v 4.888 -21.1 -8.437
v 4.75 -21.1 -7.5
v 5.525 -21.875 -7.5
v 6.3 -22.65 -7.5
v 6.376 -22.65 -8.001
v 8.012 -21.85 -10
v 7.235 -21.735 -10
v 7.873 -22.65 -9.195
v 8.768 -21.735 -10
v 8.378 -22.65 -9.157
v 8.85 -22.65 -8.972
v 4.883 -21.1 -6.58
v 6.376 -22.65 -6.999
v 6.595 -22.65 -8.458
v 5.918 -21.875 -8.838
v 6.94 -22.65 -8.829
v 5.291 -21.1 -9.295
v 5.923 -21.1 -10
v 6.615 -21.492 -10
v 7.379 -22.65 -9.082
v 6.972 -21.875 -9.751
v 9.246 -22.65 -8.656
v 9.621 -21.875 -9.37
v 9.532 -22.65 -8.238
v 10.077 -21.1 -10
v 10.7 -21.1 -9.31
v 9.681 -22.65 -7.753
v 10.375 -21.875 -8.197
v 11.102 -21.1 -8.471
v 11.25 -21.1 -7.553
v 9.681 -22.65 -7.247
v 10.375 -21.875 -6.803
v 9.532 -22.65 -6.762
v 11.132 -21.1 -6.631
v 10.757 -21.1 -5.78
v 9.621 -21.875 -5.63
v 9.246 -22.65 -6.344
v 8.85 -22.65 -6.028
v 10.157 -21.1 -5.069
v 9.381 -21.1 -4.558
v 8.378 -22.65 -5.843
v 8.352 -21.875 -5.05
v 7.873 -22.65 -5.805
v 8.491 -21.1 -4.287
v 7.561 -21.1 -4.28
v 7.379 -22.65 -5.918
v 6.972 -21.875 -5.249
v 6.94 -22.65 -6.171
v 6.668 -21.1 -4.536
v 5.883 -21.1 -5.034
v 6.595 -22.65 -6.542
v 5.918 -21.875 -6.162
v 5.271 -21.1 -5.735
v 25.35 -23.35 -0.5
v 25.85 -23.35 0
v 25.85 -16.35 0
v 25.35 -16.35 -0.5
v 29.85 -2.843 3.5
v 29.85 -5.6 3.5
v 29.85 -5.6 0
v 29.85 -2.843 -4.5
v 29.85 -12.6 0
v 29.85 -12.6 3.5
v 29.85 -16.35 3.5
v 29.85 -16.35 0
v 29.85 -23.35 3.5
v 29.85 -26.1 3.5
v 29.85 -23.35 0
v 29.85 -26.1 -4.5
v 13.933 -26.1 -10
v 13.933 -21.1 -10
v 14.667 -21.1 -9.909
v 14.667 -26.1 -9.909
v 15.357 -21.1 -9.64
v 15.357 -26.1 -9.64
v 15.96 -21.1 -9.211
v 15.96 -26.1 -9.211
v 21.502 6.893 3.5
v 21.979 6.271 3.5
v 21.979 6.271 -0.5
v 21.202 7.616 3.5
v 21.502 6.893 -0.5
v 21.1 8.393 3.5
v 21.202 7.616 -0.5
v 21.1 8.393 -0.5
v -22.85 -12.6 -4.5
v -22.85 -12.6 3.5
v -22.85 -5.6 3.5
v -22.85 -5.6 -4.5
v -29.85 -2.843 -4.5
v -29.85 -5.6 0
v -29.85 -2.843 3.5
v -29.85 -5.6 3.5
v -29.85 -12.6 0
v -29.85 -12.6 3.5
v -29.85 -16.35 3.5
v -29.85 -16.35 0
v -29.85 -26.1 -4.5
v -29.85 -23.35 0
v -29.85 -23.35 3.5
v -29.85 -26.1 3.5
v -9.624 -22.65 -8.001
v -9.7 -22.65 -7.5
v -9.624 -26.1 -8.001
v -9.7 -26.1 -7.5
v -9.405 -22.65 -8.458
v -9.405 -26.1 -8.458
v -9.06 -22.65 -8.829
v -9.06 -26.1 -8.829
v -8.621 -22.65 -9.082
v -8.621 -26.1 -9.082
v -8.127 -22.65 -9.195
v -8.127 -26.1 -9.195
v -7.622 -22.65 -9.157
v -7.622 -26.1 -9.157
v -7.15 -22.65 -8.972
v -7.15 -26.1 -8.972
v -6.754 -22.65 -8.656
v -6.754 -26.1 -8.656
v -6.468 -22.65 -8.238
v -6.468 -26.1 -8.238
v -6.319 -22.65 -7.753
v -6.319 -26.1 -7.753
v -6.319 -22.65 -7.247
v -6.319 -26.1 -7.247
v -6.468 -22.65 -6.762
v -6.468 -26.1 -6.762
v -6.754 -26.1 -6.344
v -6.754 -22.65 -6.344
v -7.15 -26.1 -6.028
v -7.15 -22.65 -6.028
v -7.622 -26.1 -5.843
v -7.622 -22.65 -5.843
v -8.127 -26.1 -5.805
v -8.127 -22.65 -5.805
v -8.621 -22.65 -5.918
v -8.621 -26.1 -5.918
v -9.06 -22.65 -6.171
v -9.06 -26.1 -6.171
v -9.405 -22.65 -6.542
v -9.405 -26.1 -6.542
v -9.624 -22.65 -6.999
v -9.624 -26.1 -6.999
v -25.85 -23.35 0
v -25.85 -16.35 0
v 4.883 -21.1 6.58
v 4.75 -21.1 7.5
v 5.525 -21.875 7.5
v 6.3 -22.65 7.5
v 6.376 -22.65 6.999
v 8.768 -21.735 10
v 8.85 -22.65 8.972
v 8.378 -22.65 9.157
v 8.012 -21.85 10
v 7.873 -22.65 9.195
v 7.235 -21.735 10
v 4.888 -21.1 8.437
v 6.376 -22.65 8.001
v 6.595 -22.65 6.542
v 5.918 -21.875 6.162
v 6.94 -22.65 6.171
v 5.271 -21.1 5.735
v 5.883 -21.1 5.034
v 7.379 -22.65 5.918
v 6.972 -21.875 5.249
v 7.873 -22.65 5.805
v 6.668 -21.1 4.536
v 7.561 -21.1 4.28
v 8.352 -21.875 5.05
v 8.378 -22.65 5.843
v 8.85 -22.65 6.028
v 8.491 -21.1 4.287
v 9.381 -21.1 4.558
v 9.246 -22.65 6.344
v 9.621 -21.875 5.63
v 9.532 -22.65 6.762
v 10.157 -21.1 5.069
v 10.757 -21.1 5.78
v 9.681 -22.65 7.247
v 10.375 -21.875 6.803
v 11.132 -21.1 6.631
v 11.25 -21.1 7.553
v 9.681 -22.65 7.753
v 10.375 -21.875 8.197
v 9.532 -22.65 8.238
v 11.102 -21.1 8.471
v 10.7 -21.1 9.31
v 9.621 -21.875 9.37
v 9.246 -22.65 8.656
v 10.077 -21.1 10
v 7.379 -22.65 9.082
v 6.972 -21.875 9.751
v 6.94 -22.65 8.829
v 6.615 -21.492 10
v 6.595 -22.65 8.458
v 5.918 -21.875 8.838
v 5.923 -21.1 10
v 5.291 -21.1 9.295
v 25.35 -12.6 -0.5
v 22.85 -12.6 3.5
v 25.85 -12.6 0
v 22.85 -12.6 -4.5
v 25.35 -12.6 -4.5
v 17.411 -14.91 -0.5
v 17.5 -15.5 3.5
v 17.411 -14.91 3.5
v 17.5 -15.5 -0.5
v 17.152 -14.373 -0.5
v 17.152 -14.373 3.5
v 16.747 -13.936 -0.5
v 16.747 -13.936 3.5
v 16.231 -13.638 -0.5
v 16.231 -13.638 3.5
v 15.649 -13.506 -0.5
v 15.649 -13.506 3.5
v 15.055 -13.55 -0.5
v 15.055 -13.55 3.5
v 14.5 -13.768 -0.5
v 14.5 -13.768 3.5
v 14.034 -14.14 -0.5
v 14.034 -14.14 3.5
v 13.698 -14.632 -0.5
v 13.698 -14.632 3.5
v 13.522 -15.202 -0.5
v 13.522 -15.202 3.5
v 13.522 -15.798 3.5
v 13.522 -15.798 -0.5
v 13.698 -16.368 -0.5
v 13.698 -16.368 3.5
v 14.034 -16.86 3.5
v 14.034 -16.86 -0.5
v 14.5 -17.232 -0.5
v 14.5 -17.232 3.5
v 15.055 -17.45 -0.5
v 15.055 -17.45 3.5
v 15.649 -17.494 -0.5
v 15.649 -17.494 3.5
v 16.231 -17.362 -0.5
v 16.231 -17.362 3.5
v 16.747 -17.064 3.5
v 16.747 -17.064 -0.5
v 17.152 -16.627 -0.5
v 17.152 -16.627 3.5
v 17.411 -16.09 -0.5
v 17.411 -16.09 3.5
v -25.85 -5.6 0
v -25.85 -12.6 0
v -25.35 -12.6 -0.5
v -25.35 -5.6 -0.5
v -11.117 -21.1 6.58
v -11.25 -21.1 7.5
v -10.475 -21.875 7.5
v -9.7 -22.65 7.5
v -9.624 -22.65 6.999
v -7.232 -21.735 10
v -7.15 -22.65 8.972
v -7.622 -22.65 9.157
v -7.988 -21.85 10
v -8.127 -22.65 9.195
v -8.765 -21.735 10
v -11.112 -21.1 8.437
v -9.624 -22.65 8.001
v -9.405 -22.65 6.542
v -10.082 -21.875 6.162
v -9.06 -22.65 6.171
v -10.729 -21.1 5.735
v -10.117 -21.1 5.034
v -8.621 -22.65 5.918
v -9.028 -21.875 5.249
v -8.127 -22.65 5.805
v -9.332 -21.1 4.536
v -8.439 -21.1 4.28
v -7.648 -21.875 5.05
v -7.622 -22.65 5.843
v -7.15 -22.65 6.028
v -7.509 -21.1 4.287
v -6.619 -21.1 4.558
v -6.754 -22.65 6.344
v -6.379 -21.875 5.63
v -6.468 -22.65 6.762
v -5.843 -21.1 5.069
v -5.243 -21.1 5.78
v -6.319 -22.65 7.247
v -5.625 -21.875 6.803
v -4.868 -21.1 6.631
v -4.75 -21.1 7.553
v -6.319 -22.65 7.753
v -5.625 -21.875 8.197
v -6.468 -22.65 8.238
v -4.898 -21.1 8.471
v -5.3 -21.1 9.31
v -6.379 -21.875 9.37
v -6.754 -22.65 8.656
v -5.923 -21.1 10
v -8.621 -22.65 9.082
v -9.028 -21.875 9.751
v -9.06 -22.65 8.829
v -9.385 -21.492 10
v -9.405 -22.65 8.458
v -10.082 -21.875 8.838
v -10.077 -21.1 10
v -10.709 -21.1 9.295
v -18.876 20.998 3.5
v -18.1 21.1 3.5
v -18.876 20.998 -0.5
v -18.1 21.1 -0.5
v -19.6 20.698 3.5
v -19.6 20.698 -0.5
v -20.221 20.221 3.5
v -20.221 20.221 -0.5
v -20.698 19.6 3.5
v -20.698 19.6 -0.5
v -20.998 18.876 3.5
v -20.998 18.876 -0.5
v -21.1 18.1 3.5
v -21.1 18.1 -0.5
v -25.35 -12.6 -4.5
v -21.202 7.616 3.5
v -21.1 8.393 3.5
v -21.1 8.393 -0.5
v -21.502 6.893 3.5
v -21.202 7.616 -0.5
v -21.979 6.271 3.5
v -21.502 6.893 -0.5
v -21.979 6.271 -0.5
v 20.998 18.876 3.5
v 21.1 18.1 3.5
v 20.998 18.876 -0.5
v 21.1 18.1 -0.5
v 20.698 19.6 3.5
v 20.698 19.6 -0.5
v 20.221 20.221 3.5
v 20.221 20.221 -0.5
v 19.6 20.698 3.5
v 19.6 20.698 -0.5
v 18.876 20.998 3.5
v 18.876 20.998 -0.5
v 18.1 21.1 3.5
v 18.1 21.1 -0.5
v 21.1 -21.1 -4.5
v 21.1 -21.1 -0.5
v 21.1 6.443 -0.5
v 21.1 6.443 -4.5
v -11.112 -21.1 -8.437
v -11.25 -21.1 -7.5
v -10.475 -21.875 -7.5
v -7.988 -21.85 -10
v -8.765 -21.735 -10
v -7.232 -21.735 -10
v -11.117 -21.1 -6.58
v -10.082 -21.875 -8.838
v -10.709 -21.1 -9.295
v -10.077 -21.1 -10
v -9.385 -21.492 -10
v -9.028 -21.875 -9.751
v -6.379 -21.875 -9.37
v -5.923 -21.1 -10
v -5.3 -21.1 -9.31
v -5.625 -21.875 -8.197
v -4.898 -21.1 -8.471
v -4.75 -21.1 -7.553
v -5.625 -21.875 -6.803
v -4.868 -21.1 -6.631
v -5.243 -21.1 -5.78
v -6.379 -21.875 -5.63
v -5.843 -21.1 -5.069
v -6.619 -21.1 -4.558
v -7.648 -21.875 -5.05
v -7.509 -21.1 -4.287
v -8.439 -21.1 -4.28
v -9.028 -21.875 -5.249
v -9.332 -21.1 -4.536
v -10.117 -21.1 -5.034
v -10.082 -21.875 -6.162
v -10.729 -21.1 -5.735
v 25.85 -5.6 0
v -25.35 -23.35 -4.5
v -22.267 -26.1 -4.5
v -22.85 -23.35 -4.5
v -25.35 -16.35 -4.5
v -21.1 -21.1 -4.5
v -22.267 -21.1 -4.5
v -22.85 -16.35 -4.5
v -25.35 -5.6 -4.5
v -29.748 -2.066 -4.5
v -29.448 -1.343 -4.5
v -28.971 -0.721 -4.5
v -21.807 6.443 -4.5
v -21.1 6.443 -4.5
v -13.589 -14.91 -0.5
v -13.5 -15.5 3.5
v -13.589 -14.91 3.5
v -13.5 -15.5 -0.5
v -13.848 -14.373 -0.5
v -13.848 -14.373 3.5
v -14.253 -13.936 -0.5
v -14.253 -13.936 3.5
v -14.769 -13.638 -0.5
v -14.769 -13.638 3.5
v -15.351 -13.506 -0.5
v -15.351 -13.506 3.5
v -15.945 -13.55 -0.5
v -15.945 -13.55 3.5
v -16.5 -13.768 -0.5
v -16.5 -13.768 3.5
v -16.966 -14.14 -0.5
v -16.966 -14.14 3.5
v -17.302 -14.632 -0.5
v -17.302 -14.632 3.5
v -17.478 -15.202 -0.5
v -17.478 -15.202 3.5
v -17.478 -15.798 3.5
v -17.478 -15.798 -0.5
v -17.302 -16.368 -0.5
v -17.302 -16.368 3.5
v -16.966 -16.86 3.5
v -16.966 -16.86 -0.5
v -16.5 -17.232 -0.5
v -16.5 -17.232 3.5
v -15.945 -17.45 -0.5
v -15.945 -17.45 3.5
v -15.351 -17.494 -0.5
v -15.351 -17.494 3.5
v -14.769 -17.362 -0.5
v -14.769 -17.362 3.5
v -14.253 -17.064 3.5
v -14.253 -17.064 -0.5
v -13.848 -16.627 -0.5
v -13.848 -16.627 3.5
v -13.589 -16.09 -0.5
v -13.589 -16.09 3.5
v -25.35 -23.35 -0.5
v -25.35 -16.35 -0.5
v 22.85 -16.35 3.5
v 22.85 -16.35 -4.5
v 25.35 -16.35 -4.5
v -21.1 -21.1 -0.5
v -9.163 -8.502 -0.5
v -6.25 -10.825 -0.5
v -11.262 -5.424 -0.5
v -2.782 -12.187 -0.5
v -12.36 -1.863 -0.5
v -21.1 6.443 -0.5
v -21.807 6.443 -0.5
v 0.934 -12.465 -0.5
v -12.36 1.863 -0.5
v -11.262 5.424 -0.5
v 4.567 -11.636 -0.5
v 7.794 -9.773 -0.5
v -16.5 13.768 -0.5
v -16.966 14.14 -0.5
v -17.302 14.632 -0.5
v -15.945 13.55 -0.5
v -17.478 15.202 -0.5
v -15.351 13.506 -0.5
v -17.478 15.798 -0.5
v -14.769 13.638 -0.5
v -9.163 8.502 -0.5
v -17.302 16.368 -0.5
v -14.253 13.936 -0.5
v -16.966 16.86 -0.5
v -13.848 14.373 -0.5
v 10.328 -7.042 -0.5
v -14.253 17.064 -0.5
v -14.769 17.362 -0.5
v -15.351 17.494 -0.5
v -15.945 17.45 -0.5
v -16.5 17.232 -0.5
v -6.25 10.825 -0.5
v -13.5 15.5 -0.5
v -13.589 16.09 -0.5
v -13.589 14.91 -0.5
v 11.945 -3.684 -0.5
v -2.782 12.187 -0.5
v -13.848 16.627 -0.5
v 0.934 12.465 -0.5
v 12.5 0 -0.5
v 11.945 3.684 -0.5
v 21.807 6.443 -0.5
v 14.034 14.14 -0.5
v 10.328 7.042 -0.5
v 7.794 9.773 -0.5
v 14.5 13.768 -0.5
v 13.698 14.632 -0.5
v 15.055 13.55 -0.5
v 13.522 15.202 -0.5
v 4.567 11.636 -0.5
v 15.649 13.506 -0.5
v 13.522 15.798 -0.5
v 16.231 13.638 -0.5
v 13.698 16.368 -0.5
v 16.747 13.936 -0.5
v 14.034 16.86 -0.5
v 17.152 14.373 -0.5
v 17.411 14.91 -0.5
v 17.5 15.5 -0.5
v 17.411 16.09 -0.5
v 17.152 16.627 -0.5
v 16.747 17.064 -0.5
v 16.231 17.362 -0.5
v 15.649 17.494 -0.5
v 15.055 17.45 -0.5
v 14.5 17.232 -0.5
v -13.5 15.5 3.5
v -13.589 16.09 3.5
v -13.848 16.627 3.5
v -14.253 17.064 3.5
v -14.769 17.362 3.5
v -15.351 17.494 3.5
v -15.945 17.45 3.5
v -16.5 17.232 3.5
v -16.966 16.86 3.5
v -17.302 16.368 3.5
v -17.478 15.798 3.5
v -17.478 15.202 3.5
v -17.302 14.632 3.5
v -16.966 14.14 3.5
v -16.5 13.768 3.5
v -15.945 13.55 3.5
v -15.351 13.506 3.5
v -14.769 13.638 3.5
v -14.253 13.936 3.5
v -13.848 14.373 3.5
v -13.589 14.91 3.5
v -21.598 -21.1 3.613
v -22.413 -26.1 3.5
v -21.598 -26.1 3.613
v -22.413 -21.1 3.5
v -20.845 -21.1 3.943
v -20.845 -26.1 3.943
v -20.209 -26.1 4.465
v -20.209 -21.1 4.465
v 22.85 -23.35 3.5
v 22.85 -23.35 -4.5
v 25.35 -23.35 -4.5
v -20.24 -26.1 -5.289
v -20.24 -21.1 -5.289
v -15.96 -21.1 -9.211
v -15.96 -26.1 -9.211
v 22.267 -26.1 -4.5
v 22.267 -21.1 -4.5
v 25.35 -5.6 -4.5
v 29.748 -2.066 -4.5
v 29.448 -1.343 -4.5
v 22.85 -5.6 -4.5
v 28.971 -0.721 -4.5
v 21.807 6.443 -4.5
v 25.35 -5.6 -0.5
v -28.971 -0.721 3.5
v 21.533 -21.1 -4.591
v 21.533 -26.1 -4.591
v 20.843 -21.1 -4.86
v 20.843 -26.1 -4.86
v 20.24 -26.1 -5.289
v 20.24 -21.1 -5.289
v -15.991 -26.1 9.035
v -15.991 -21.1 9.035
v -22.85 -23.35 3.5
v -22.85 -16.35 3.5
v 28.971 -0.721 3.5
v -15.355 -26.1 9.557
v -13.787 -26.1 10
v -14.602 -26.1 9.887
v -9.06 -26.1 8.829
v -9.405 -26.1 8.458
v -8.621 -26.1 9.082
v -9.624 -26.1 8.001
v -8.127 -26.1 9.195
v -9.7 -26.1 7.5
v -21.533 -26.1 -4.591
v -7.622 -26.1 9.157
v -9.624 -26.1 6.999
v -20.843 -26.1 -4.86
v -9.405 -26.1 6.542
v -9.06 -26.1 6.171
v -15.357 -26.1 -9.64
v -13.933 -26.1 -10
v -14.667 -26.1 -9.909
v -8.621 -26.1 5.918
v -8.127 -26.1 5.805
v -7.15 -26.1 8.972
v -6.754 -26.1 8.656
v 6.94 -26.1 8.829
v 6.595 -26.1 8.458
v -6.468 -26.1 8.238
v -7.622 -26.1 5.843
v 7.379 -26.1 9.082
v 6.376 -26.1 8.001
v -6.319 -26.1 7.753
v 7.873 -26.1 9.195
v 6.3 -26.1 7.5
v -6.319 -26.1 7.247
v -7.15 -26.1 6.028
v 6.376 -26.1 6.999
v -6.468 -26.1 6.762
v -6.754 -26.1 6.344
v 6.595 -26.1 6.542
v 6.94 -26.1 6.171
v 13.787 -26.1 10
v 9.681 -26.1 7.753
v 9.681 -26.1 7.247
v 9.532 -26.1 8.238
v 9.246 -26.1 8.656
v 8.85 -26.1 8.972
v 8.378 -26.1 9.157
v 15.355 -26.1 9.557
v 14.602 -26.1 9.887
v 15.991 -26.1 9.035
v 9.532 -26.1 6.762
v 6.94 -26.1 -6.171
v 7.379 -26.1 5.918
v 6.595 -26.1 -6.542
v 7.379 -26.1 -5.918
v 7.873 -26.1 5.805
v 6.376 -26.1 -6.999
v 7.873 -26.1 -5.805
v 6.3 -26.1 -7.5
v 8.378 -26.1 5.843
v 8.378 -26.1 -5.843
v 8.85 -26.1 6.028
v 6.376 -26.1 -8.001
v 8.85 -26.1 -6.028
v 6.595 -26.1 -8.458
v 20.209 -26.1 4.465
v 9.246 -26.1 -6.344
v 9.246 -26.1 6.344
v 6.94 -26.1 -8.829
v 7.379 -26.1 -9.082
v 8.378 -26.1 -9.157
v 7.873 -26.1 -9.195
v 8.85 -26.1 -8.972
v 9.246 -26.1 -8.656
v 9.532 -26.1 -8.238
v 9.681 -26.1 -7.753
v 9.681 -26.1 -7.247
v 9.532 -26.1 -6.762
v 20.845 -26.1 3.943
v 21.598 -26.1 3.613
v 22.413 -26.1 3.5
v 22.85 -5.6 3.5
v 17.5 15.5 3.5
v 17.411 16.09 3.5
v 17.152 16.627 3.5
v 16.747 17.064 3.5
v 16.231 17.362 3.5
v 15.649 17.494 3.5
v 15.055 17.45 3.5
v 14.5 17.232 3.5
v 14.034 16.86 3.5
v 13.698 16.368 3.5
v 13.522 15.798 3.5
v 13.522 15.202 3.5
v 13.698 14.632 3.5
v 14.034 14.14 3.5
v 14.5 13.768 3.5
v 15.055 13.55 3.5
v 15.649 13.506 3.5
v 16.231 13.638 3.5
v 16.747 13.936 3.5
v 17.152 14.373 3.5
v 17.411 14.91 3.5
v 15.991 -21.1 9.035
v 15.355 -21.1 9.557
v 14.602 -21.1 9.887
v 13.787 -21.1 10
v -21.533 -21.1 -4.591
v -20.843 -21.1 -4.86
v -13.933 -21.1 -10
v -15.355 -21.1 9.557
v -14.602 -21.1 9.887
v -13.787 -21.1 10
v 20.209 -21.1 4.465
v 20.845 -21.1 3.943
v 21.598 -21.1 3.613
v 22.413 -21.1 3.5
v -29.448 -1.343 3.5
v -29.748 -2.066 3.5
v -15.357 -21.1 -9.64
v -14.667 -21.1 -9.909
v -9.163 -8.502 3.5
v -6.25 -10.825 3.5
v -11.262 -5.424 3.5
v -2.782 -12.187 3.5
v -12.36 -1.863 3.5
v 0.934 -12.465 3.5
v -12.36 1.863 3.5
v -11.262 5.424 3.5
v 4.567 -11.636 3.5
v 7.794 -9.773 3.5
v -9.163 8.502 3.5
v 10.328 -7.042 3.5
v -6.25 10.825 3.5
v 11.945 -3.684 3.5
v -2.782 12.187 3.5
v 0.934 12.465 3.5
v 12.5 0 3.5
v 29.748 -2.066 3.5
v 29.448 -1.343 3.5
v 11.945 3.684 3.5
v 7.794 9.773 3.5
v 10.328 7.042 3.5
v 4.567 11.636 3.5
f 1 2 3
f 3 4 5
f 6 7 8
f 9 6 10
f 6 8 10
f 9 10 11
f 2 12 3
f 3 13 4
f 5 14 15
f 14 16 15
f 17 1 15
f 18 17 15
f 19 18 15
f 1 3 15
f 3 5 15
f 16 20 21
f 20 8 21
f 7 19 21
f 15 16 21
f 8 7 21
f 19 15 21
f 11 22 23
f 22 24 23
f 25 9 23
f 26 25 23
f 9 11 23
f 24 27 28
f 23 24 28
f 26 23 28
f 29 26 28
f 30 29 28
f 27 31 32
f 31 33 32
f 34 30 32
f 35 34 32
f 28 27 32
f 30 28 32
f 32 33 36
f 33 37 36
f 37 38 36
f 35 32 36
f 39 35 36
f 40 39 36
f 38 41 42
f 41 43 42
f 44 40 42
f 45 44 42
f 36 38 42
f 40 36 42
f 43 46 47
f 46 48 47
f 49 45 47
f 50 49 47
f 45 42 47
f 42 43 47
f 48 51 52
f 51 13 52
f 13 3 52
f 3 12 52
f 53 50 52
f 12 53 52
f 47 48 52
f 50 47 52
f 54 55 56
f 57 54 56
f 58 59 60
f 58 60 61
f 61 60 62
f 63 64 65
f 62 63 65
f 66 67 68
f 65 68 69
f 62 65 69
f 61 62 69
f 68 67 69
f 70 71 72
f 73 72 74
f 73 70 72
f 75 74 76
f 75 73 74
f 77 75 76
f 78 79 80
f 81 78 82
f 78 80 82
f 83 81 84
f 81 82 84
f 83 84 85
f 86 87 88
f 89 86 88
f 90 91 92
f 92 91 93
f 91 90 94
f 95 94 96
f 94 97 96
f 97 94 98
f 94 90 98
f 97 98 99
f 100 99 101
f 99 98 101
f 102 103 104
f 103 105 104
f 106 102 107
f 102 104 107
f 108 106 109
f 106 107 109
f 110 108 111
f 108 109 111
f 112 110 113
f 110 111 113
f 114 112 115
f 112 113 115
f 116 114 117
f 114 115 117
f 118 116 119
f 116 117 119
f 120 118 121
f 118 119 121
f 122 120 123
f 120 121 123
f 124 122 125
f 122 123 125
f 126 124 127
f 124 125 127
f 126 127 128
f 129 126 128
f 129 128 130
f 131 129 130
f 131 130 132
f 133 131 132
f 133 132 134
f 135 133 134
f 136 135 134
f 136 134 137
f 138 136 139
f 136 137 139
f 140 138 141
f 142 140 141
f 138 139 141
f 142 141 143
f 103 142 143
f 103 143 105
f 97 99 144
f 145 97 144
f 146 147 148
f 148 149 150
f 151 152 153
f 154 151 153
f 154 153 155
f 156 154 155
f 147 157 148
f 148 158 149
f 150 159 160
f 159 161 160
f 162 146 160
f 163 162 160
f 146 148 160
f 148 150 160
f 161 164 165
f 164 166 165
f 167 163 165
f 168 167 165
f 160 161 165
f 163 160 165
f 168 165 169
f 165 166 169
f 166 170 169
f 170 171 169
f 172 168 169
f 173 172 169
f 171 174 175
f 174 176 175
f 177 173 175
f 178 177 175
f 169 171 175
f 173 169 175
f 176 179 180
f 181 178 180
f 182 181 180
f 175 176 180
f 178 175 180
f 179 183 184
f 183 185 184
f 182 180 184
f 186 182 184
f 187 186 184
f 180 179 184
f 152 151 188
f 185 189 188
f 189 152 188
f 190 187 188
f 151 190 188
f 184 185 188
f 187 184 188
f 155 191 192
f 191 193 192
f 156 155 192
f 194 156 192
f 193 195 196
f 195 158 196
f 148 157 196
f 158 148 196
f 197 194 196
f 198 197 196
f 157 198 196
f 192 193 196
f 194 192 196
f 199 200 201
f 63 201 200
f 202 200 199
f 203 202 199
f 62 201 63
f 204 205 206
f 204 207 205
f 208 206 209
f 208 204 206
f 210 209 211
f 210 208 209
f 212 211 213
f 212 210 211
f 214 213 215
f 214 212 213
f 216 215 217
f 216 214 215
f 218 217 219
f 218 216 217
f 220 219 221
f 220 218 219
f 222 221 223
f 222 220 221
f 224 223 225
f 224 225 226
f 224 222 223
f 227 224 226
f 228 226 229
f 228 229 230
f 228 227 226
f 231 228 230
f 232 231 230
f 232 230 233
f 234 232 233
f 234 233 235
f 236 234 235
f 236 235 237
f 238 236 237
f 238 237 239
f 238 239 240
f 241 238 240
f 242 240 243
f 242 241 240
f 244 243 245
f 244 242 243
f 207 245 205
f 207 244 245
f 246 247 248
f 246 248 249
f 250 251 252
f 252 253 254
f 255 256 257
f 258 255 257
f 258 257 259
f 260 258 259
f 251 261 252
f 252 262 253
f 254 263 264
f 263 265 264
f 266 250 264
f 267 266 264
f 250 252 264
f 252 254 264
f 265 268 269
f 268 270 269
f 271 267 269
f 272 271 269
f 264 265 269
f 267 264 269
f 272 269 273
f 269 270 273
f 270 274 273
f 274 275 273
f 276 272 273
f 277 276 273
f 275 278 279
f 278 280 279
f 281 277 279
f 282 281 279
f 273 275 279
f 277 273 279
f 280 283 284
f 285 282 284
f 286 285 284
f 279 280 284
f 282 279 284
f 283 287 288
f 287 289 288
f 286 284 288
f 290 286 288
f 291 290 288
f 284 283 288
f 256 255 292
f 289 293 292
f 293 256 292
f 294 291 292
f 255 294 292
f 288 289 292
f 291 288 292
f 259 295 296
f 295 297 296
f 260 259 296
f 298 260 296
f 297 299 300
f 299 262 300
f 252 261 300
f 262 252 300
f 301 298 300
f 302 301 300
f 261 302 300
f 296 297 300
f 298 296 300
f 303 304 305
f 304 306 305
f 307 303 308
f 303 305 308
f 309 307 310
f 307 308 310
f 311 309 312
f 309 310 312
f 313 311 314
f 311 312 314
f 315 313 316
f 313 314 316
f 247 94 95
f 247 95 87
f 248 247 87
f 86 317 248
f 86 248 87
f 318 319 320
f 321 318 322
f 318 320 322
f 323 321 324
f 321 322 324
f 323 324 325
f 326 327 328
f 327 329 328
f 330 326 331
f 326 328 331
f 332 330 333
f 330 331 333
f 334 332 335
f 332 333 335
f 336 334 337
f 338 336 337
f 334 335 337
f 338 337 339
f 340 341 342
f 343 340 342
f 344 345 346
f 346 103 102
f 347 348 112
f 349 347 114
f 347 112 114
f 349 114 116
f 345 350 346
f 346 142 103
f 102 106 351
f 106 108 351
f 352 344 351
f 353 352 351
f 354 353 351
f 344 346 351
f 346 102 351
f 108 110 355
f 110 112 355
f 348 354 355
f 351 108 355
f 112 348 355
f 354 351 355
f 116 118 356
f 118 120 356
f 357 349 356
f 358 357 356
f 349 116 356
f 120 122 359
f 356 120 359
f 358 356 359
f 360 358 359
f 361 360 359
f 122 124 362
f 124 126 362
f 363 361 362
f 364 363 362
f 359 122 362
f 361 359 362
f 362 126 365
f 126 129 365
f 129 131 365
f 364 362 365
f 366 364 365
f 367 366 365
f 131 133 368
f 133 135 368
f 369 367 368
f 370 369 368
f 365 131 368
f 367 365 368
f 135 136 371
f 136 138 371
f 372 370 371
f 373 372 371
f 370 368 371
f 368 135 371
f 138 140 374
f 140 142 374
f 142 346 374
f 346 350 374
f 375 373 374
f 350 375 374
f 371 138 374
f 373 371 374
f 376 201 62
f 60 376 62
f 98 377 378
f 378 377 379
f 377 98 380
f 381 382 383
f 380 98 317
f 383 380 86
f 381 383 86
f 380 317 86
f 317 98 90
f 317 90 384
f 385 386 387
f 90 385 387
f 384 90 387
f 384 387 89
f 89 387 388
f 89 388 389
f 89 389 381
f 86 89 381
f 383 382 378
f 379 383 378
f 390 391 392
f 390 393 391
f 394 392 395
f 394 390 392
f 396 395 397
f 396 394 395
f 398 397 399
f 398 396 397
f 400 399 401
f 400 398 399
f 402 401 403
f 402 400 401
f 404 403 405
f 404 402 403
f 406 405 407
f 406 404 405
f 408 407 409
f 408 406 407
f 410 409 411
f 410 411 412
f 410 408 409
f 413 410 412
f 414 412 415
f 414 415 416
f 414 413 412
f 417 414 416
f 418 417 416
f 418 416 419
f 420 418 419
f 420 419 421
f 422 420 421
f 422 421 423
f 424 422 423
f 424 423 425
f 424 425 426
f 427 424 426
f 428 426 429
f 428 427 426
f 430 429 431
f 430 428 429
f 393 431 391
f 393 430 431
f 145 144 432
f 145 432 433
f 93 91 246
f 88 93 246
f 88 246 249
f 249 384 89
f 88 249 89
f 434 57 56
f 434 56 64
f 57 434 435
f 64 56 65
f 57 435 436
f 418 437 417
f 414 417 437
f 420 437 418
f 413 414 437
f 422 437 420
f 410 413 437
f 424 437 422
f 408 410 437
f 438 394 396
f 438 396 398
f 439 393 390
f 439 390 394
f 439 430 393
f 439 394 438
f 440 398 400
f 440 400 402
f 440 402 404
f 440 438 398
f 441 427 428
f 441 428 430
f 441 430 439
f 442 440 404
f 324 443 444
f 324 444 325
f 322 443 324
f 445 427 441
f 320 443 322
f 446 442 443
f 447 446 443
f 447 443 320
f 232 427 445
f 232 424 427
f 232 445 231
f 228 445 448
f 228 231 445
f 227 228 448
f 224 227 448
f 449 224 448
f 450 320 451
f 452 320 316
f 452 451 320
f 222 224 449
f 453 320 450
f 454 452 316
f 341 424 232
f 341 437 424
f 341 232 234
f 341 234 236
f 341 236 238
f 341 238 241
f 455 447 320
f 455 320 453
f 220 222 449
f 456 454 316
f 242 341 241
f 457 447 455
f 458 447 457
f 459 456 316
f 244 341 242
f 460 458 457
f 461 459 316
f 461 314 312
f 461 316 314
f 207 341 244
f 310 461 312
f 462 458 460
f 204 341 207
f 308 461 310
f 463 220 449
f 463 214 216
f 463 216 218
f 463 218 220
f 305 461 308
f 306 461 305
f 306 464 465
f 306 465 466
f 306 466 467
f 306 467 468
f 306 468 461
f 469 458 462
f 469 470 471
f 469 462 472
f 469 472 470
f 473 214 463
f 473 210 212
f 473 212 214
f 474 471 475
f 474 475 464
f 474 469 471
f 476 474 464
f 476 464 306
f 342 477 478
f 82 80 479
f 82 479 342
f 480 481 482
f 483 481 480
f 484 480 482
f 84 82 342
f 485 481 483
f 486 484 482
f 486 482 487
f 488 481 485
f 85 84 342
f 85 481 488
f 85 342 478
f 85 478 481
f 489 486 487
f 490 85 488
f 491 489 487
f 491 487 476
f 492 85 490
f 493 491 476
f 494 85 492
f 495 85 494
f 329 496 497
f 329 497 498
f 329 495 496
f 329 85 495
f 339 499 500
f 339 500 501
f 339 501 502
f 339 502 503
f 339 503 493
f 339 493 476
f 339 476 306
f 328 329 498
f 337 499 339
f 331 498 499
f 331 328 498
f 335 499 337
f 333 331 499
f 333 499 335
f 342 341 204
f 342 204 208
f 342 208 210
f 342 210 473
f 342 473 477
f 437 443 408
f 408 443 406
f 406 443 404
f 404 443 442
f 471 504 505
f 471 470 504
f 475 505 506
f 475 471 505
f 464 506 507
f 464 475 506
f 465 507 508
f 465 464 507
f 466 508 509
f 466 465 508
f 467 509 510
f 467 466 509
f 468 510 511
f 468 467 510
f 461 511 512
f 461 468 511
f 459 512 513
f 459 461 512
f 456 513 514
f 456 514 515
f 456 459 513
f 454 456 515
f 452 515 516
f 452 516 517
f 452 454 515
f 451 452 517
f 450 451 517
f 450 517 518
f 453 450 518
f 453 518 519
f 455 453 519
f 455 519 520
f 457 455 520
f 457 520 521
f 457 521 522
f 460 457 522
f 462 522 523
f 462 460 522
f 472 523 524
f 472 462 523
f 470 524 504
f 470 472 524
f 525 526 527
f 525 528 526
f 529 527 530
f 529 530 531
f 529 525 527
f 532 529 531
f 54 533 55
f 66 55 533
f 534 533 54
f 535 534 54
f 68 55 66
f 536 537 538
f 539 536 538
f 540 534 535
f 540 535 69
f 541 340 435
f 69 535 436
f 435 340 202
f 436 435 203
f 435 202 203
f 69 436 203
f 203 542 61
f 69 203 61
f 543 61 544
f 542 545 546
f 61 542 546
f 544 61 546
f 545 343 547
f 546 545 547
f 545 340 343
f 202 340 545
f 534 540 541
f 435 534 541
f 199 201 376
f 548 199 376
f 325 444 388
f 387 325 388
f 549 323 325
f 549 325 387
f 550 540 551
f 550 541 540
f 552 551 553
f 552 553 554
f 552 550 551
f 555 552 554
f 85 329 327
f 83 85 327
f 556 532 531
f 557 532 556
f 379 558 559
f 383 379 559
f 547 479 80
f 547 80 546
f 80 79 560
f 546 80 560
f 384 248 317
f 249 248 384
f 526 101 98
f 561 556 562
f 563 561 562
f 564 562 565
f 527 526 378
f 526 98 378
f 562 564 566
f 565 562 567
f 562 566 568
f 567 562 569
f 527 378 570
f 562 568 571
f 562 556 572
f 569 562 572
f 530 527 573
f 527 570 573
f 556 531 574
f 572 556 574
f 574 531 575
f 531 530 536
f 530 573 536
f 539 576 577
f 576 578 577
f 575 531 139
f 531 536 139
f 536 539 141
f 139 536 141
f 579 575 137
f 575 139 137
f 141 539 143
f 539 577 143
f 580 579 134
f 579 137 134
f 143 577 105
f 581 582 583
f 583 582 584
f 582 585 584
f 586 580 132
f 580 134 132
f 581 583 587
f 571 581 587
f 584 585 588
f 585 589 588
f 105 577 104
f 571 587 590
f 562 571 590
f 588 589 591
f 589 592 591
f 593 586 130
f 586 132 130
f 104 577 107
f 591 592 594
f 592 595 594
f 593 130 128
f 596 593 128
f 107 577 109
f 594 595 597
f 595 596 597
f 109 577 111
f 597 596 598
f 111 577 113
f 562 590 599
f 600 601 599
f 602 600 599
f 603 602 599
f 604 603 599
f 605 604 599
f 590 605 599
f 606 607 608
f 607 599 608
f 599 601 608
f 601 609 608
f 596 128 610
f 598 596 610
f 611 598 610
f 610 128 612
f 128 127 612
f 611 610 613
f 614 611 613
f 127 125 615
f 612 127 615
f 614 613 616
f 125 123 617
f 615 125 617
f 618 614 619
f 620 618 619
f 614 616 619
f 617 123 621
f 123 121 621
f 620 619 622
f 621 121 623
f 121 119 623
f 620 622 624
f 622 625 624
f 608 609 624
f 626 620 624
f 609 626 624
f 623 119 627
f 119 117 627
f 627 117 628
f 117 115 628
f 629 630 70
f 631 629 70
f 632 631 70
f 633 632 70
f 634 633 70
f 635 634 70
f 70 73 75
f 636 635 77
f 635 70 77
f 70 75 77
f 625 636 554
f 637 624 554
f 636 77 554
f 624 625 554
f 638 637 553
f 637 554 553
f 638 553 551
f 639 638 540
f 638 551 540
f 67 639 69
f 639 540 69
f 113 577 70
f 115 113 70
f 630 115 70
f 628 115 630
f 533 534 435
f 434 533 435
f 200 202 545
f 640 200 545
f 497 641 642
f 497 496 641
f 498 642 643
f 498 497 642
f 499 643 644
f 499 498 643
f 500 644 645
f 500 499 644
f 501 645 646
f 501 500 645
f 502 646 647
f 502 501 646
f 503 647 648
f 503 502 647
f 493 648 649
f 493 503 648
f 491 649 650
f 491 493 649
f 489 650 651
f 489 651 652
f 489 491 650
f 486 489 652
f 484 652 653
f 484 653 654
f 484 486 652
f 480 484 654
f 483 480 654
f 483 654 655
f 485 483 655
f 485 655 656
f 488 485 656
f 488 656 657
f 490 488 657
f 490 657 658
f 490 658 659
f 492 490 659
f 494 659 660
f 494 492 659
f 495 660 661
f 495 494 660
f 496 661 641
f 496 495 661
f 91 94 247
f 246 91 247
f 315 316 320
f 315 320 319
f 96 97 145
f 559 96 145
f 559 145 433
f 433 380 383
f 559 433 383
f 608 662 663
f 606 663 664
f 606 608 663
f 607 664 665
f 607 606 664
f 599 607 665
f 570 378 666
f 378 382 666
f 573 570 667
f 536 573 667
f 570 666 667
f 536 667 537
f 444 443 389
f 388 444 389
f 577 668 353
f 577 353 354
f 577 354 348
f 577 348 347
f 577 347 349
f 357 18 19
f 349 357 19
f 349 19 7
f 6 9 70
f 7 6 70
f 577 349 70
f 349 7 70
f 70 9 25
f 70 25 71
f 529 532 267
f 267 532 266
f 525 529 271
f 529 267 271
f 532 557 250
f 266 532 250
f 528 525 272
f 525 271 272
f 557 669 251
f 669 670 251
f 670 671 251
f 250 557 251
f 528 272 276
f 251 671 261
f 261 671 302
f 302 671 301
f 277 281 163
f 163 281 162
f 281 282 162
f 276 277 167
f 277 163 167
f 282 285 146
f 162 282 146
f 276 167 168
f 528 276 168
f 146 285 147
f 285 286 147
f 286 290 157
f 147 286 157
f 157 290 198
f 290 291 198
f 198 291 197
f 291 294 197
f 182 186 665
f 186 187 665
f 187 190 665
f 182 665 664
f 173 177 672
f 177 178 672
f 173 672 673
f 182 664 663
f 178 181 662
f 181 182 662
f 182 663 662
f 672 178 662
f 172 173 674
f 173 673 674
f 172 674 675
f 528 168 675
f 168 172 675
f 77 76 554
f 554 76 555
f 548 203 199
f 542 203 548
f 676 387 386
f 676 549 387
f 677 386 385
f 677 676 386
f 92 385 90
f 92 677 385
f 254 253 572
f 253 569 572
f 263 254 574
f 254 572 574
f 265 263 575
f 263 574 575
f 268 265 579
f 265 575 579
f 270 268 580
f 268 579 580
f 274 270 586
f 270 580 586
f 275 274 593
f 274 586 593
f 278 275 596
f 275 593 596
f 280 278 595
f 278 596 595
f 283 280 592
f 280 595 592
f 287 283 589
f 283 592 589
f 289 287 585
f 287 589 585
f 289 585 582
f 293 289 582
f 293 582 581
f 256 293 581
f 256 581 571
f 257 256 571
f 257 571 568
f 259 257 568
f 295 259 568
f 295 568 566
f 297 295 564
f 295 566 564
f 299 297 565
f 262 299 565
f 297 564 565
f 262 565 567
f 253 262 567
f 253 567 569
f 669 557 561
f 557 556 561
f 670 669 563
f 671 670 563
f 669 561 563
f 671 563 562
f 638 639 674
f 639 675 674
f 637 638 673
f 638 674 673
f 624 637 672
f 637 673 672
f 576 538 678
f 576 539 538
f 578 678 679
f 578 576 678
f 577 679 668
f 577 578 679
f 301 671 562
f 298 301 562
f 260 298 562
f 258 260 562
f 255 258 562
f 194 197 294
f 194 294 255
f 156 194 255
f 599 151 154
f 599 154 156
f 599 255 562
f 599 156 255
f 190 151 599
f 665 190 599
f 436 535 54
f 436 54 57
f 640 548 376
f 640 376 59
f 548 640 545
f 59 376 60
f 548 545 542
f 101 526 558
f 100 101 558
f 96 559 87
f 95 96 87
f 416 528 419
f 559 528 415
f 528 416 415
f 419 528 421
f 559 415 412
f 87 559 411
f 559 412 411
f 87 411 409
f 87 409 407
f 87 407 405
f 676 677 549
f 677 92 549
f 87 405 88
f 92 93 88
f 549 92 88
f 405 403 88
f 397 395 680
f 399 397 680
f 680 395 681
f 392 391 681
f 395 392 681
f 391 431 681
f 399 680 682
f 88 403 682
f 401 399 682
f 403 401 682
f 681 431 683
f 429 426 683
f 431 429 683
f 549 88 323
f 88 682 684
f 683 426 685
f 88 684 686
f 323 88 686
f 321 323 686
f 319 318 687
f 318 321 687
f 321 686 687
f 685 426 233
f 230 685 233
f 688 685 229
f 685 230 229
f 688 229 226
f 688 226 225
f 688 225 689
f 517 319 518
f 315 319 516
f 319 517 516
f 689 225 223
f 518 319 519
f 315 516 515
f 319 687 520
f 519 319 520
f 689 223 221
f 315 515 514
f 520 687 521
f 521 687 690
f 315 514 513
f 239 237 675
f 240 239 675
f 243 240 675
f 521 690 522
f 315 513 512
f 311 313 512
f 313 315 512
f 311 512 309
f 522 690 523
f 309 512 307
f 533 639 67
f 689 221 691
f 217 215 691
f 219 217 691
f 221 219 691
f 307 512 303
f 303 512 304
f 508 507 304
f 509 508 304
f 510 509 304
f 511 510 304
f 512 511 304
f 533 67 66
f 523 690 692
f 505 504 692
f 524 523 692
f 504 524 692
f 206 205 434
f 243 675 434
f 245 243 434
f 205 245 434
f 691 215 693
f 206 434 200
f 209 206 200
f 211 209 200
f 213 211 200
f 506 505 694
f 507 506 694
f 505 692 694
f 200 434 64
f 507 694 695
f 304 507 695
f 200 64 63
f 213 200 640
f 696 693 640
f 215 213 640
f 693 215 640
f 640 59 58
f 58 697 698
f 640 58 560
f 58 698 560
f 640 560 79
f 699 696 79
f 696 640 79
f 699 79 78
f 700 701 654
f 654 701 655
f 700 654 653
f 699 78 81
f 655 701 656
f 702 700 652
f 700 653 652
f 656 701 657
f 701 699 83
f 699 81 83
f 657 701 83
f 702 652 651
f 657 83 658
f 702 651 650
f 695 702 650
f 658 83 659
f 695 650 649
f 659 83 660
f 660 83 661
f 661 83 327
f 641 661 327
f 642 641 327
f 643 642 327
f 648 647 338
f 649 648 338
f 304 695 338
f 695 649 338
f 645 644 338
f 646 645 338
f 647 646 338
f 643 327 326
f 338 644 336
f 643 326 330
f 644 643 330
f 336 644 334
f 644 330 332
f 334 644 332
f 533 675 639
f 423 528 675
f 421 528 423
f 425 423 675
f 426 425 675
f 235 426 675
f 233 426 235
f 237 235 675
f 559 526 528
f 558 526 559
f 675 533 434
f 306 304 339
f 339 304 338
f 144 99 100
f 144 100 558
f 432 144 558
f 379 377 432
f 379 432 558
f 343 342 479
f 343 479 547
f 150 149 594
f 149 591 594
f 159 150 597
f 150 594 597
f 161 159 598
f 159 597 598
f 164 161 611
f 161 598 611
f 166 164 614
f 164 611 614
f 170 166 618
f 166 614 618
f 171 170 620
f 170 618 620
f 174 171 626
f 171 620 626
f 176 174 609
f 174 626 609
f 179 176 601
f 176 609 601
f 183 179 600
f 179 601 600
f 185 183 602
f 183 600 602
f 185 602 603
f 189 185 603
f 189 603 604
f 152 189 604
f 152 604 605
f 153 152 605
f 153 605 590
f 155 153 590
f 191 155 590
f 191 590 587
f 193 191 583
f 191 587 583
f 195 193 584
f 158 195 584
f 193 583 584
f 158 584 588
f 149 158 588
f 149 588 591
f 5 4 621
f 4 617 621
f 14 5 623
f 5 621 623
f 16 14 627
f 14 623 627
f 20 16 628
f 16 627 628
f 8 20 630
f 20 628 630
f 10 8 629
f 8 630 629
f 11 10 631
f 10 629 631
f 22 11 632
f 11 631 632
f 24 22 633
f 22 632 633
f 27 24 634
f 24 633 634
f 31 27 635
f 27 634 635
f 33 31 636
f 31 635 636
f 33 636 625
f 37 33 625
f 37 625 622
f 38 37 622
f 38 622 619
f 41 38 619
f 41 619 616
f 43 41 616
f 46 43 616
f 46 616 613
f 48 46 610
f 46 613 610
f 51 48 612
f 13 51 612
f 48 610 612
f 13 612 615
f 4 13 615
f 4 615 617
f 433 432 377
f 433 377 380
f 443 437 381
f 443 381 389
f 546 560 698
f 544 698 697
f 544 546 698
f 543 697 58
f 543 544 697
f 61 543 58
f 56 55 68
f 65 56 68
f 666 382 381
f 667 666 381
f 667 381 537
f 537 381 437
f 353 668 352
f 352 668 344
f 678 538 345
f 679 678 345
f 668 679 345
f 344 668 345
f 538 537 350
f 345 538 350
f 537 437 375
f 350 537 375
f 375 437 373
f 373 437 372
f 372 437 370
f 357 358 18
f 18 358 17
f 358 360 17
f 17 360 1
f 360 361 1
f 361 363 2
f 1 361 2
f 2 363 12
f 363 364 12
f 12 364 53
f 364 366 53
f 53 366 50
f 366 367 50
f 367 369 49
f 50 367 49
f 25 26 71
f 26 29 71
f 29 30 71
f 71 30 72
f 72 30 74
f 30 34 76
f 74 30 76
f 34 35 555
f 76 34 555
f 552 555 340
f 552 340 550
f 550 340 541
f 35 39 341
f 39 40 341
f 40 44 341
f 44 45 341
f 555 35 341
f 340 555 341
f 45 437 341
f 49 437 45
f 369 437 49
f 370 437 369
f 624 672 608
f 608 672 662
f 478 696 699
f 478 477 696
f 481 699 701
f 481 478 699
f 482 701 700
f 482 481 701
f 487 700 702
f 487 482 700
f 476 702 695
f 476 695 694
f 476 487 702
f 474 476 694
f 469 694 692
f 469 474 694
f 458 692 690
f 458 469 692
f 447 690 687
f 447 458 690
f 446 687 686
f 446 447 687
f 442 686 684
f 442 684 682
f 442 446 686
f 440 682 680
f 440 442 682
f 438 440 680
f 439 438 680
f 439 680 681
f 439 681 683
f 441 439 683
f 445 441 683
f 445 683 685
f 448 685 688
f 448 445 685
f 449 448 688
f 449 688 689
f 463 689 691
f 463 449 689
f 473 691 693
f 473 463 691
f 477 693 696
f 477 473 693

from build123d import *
from OCP.BRepFilletAPI import BRepFilletAPI_MakeChamfer

# Parameters (mm, degrees)
SKETCH1_W                                       = 42.2
SKETCH1_H                                       = 42.2
SKETCH1_R                                       = 12.5
SKETCH1_R_2                                     = 2
BOSS_EXTRUDE1_DEPTH                             = 2
SKETCH2_W                                       = 42.2
SKETCH2_H                                       = 20
SKETCH2_R                                       = 1.625
BOSS_EXTRUDE2_DEPTH                             = 5
BOSS_EXTRUDE3_DEPTH                             = 3.5
BOSS_EXTRUDE3_DEPTH_BACK                        = 2
SKETCH3_W                                       = 8.75
SKETCH3_H                                       = 23.25
SKETCH3_W_2                                     = 2.5
SKETCH3_H_2                                     = 7
CUT_EXTRUDE1_START                              = -3.5
SKETCH4_W                                       = 4.5
SKETCH4_H                                       = 7
CUT_EXTRUDE1_DEPTH                              = 3.5
CSK_FOR_M3_FLAT_HEAD_MACHINE_SCREW1_D           = 3.4
CSK_FOR_M3_FLAT_HEAD_MACHINE_SCREW1_CSINK_D     = 6.5
CSK_FOR_M3_FLAT_HEAD_MACHINE_SCREW1_CSINK_ANGLE = 90
SKETCH10_W                                      = 8.75
SKETCH10_H                                      = 23.25
SKETCH10_W_2                                    = 2.5
SKETCH10_H_2                                    = 7
BOSS_EXTRUDE4_DEPTH                             = 4
CUT_EXTRUDE3_DEPTH                              = 10
CHAMFER1_SIZE                                   = 10
FILLET2_R                                       = 3
FILLET3_R                                       = 3
FILLET4_R                                       = 3
CHAMFER2_SIZE                                   = 1
CHAMFER2_SIZE2                                  = 0.707106781
CHAMFER3_SIZE                                   = 0.5


with BuildPart() as part:
    # Sketch1 → Boss-Extrude1 (new, symmetric)
    with BuildSketch(Plane.XY.offset(1.5)):
        Rectangle(SKETCH1_W, SKETCH1_H)
        Circle(SKETCH1_R, mode=Mode.SUBTRACT)
        with Locations((15.5, 15.5)):
            Circle(SKETCH1_R_2, mode=Mode.SUBTRACT)
        with Locations((15.5, -15.5)):
            Circle(SKETCH1_R_2, mode=Mode.SUBTRACT)
        with Locations((-15.5, -15.5)):
            Circle(SKETCH1_R_2, mode=Mode.SUBTRACT)
        with Locations((-15.5, 15.5)):
            Circle(SKETCH1_R_2, mode=Mode.SUBTRACT)
    extrude(amount=BOSS_EXTRUDE1_DEPTH, both=True)

    # Sketch2 → Boss-Extrude2 (add)
    with BuildSketch(Plane.XZ.offset(21.1)):
        Rectangle(SKETCH2_W, SKETCH2_H)
        with Locations(Location((8, 7.5, 0), (0, 0, 270))):
            Circle(SKETCH2_R, mode=Mode.SUBTRACT)
        with Locations(Location((8, -7.5, 0), (0, 0, 270))):
            Circle(SKETCH2_R, mode=Mode.SUBTRACT)
        with Locations(Location((-8, -7.5, 0), (0, 0, 270))):
            Circle(SKETCH2_R, mode=Mode.SUBTRACT)
        with Locations(Location((-8, 7.5, 0), (0, 0, 270))):
            Circle(SKETCH2_R, mode=Mode.SUBTRACT)
    extrude(amount=BOSS_EXTRUDE2_DEPTH)

    # Sketch3 → Boss-Extrude3 (add, two sides: drawn at the far end of the back side and taken through both)
    # profile 1 of 2: a face of its own
    with BuildSketch(Plane.XY.offset(-BOSS_EXTRUDE3_DEPTH_BACK)):
        with Locations((-25.475, -14.475)):
            Rectangle(SKETCH3_W, SKETCH3_H)
        with Locations((-24.1, -9.1)):
            Rectangle(SKETCH3_W_2, SKETCH3_H_2, mode=Mode.SUBTRACT)
        with Locations((-24.1, -19.85)):
            Rectangle(SKETCH3_W_2, SKETCH3_H_2, mode=Mode.SUBTRACT)
    # profile 2 of 2: a face of its own
    with BuildSketch(Plane.XY.offset(-BOSS_EXTRUDE3_DEPTH_BACK)):
        with Locations((25.475, -14.475)):
            Rectangle(SKETCH3_W, SKETCH3_H)
        with Locations((24.1, -9.1)):
            Rectangle(SKETCH3_W_2, SKETCH3_H_2, mode=Mode.SUBTRACT)
        with Locations((24.1, -19.85)):
            Rectangle(SKETCH3_W_2, SKETCH3_H_2, mode=Mode.SUBTRACT)
    extrude(amount=BOSS_EXTRUDE3_DEPTH + BOSS_EXTRUDE3_DEPTH_BACK)

    # Sketch4 → Cut-Extrude1 (cut)
    with BuildSketch(Plane.XY.offset(3.5).offset(CUT_EXTRUDE1_START)):
        with Locations((-27.6, -9.1)):
            Rectangle(SKETCH4_W, SKETCH4_H)
        with Locations((-27.6, -19.85)):
            Rectangle(SKETCH4_W, SKETCH4_H)
        with Locations((27.6, -19.85)):
            Rectangle(SKETCH4_W, SKETCH4_H)
        with Locations((27.6, -9.1)):
            Rectangle(SKETCH4_W, SKETCH4_H)
    extrude(amount=CUT_EXTRUDE1_DEPTH, mode=Mode.SUBTRACT)

    # CSK for M3 Flat Head Machine Screw1 (through all)
    with Locations(Plane(origin=(0, -21.1, 0), x_dir=(1, 0, 0), z_dir=(0, 1, 0))):
        with Locations((-8, -7.5), (8, -7.5), (-8, 7.5), (8, 7.5)):
            CounterSinkHole(CSK_FOR_M3_FLAT_HEAD_MACHINE_SCREW1_D / 2, CSK_FOR_M3_FLAT_HEAD_MACHINE_SCREW1_CSINK_D / 2, counter_sink_angle=CSK_FOR_M3_FLAT_HEAD_MACHINE_SCREW1_CSINK_ANGLE)

    # Sketch10 → Boss-Extrude4 (add)
    # profile 1 of 2: a face of its own
    with BuildSketch(Plane(origin=(0, 0, -0.5), x_dir=(-1, 0, 0), z_dir=(0, 0, -1))):
        with Locations((25.475, -14.475)):
            Rectangle(SKETCH10_W, SKETCH10_H)
        with Locations((24.1, -19.85)):
            Rectangle(SKETCH10_W_2, SKETCH10_H_2, mode=Mode.SUBTRACT)
        with Locations((24.1, -9.1)):
            Rectangle(SKETCH10_W_2, SKETCH10_H_2, mode=Mode.SUBTRACT)
    # profile 2 of 2: a face of its own
    with BuildSketch(Plane(origin=(0, 0, -0.5), x_dir=(-1, 0, 0), z_dir=(0, 0, -1))):
        with Locations((-25.475, -14.475)):
            Rectangle(SKETCH10_W, SKETCH10_H)
        with Locations((-24.1, -19.85)):
            Rectangle(SKETCH10_W_2, SKETCH10_H_2, mode=Mode.SUBTRACT)
        with Locations((-24.1, -9.1)):
            Rectangle(SKETCH10_W_2, SKETCH10_H_2, mode=Mode.SUBTRACT)
    extrude(amount=BOSS_EXTRUDE4_DEPTH)

    # Sketch11 → Cut-Extrude3 (cut)
    with BuildSketch(Plane(origin=(0, -21.1, 0), x_dir=(1, 0, 0), z_dir=(0, 1, 0))):
        Polygon((-21.1, -3.5), (-15.1, -10), (-21.1, -10), align=None)
        Polygon((15.1, -10), (21.1, -10), (21.1, -3.5), align=None)
        Polygon((-21.1, 10), (-21.1, 4.5), (-15.1, 10), align=None)
        Polygon((21.1, 4.5), (21.1, 10), (15.1, 10), align=None)
    extrude(amount=-CUT_EXTRUDE3_DEPTH, mode=Mode.SUBTRACT)

    # Chamfer1
    # the kernel refuses this chamfer: 10 mm, written as the material it adds along each edge
    with BuildSketch(Plane(origin=(-21.1, -2.85, 3.5), x_dir=(0.027495876610585973, 0.9996219169112968, 0), z_dir=(0, 0, -1))) as chamfer1_piece_1_section:
        Polygon((CHAMFER1_SIZE * 0.999621916911, -CHAMFER1_SIZE * 0.0274958766106), (-CHAMFER1_SIZE * 0.0274958766106, -CHAMFER1_SIZE * 0.999621916911), (0, 0), align=None)
    chamfer1_piece_1 = extrude(amount=4, mode=Mode.PRIVATE)
    chamfer1_piece_1 = split(chamfer1_piece_1, bisect_by=Plane(origin=(-21.1, 0.400261982, 1.5), z_dir=(-1, 0, 0)), keep=Keep.TOP, mode=Mode.PRIVATE)
    chamfer1_piece_1 = split(chamfer1_piece_1, bisect_by=Plane(origin=(-29.85, 0.400261982, 1.5), z_dir=(1, 0, 0)), keep=Keep.TOP, mode=Mode.PRIVATE)
    add(chamfer1_piece_1)
    with BuildSketch(Plane(origin=(-21.1, -2.85, 3.5), x_dir=(0.027495876610585973, 0.9996219169112968, 0), z_dir=(0, 0, -1))) as chamfer1_piece_2_section:
        Polygon((CHAMFER1_SIZE * 0.999621916911, -CHAMFER1_SIZE * 0.0274958766106), (-CHAMFER1_SIZE * 0.0274958766106, -CHAMFER1_SIZE * 0.999621916911), (0, 0), align=None)
    chamfer1_piece_2 = extrude(amount=29.71682988, mode=Mode.PRIVATE)
    chamfer1_piece_2 = split(chamfer1_piece_2, bisect_by=Plane(origin=(-24.403786138, 0.400261982, -0.5), z_dir=(0, 0, -1)), keep=Keep.TOP, mode=Mode.PRIVATE)
    chamfer1_piece_2 = split(chamfer1_piece_2, bisect_by=Plane(origin=(-21.1, 0.400261982, -2.5), z_dir=(-1, 0, 0)), keep=Keep.TOP, mode=Mode.PRIVATE)
    chamfer1_piece_2 = split(chamfer1_piece_2, bisect_by=Plane(origin=(-24.403786138, 0.400261982, -4.5), z_dir=(0, 0, 1)), keep=Keep.TOP, mode=Mode.PRIVATE)
    chamfer1_piece_2 = split(chamfer1_piece_2, bisect_by=Plane(origin=(-29.85, 0.400261982, -2.5), z_dir=(1, 0, 0)), keep=Keep.TOP, mode=Mode.PRIVATE)
    add(chamfer1_piece_2)
    with BuildSketch(Plane(origin=(21.1, -2.85, 3.5), x_dir=(-0.027495876610585973, 0.9996219169112968, 0), z_dir=(0, 0, -1))) as chamfer1_piece_3_section:
        Polygon((CHAMFER1_SIZE * 0.999621916911, CHAMFER1_SIZE * 0.0274958766106), (-CHAMFER1_SIZE * 0.0274958766106, CHAMFER1_SIZE * 0.999621916911), (0, 0), align=None)
    chamfer1_piece_3 = extrude(amount=4, mode=Mode.PRIVATE)
    chamfer1_piece_3 = split(chamfer1_piece_3, bisect_by=Plane(origin=(21.1, 0.400261982, 1.5), z_dir=(1, 0, 0)), keep=Keep.TOP, mode=Mode.PRIVATE)
    chamfer1_piece_3 = split(chamfer1_piece_3, bisect_by=Plane(origin=(29.85, 0.400261982, 1.5), z_dir=(-1, 0, 0)), keep=Keep.TOP, mode=Mode.PRIVATE)
    add(chamfer1_piece_3)
    with BuildSketch(Plane(origin=(21.1, -2.85, 3.5), x_dir=(-0.027495876610585973, 0.9996219169112968, 0), z_dir=(0, 0, -1))) as chamfer1_piece_4_section:
        Polygon((CHAMFER1_SIZE * 0.999621916911, CHAMFER1_SIZE * 0.0274958766106), (-CHAMFER1_SIZE * 0.0274958766106, CHAMFER1_SIZE * 0.999621916911), (0, 0), align=None)
    chamfer1_piece_4 = extrude(amount=29.71682988, mode=Mode.PRIVATE)
    chamfer1_piece_4 = split(chamfer1_piece_4, bisect_by=Plane(origin=(24.403786138, 0.400261982, -0.5), z_dir=(0, 0, -1)), keep=Keep.TOP, mode=Mode.PRIVATE)
    chamfer1_piece_4 = split(chamfer1_piece_4, bisect_by=Plane(origin=(21.1, 0.400261982, -2.5), z_dir=(1, 0, 0)), keep=Keep.TOP, mode=Mode.PRIVATE)
    chamfer1_piece_4 = split(chamfer1_piece_4, bisect_by=Plane(origin=(24.403786138, 0.400261982, -4.5), z_dir=(0, 0, 1)), keep=Keep.TOP, mode=Mode.PRIVATE)
    chamfer1_piece_4 = split(chamfer1_piece_4, bisect_by=Plane(origin=(29.85, 0.400261982, -2.5), z_dir=(-1, 0, 0)), keep=Keep.TOP, mode=Mode.PRIVATE)
    add(chamfer1_piece_4)

    # Fillet2
    fillet2_edges = [part.edges().sort_by_distance(p)[0] for p in [
        (21.1, 7.15, 1.5),
        (-21.1, 7.15, 1.5),
        (29.85, -1.6, -0.5),
        (-29.85, -1.6, -0.5),
    ]]
    fillet(fillet2_edges, radius=FILLET2_R)

    # Fillet3
    fillet3_edges = [part.edges().sort_by_distance(p)[0] for p in [
        (-21.1, 21.1, 1.5),
        (21.1, 21.1, 1.5),
    ]]
    fillet(fillet3_edges, radius=FILLET3_R)

    # Fillet4
    fillet4_edges = [part.edges().sort_by_distance(p)[0] for p in [
        (21.1, -23.6, -4.5),
        (-21.1, -23.6, -4.5),
        (-15.1, -23.6, 10),
        (15.1, -23.6, 10),
        (-15.1, -23.6, -10),
        (15.1, -23.6, -10),
        (-21.1, -23.6, 3.5),
        (21.1, -23.6, 3.5),
    ]]
    fillet(fillet4_edges, radius=FILLET4_R)

    # Chamfer2: one chamfer whose edges measure the first distance from different faces: ONE call of the kernel's chamfer builder (chamfer() names one face for all edges)
    chamfer2_edges_1 = [part.edges().sort_by_distance(p)[0] for p in [
        (21.1, 7.15, -2.5),
    ]]
    chamfer2_side_1 = [part.faces().sort_by_distance(p)[0] for p in [
        (25.242344349, 3.007655651, -0.618229543),
    ]]
    chamfer2_edges_2 = [part.edges().sort_by_distance(p)[0] for p in [
        (-21.1, 7.15, -2.5),
    ]]
    chamfer2_side_2 = [part.faces().sort_by_distance(p)[0] for p in [
        (-25.242344349, 3.007655651, -0.618229543),
    ]]
    chamfer2 = BRepFilletAPI_MakeChamfer(part.part.solid().wrapped)
    for e in chamfer2_edges_1:
        chamfer2.Add(CHAMFER2_SIZE, CHAMFER2_SIZE2, e.wrapped, chamfer2_side_1[0].wrapped)  # the first distance lies on this face
    for e in chamfer2_edges_2:
        chamfer2.Add(CHAMFER2_SIZE, CHAMFER2_SIZE2, e.wrapped, chamfer2_side_2[0].wrapped)  # the first distance lies on this face
    add(Compound.cast(chamfer2.Shape()), mode=Mode.REPLACE)

    # Chamfer3
    chamfer3_edges = [part.edges().sort_by_distance(p)[0] for p in [
        (25.35, -9.1, 0),
        (25.35, -19.85, 0),
        (-25.35, -19.85, 0),
        (-25.35, -9.1, 0),
    ]]
    chamfer(chamfer3_edges, length=CHAMFER3_SIZE)


solid = part.part
